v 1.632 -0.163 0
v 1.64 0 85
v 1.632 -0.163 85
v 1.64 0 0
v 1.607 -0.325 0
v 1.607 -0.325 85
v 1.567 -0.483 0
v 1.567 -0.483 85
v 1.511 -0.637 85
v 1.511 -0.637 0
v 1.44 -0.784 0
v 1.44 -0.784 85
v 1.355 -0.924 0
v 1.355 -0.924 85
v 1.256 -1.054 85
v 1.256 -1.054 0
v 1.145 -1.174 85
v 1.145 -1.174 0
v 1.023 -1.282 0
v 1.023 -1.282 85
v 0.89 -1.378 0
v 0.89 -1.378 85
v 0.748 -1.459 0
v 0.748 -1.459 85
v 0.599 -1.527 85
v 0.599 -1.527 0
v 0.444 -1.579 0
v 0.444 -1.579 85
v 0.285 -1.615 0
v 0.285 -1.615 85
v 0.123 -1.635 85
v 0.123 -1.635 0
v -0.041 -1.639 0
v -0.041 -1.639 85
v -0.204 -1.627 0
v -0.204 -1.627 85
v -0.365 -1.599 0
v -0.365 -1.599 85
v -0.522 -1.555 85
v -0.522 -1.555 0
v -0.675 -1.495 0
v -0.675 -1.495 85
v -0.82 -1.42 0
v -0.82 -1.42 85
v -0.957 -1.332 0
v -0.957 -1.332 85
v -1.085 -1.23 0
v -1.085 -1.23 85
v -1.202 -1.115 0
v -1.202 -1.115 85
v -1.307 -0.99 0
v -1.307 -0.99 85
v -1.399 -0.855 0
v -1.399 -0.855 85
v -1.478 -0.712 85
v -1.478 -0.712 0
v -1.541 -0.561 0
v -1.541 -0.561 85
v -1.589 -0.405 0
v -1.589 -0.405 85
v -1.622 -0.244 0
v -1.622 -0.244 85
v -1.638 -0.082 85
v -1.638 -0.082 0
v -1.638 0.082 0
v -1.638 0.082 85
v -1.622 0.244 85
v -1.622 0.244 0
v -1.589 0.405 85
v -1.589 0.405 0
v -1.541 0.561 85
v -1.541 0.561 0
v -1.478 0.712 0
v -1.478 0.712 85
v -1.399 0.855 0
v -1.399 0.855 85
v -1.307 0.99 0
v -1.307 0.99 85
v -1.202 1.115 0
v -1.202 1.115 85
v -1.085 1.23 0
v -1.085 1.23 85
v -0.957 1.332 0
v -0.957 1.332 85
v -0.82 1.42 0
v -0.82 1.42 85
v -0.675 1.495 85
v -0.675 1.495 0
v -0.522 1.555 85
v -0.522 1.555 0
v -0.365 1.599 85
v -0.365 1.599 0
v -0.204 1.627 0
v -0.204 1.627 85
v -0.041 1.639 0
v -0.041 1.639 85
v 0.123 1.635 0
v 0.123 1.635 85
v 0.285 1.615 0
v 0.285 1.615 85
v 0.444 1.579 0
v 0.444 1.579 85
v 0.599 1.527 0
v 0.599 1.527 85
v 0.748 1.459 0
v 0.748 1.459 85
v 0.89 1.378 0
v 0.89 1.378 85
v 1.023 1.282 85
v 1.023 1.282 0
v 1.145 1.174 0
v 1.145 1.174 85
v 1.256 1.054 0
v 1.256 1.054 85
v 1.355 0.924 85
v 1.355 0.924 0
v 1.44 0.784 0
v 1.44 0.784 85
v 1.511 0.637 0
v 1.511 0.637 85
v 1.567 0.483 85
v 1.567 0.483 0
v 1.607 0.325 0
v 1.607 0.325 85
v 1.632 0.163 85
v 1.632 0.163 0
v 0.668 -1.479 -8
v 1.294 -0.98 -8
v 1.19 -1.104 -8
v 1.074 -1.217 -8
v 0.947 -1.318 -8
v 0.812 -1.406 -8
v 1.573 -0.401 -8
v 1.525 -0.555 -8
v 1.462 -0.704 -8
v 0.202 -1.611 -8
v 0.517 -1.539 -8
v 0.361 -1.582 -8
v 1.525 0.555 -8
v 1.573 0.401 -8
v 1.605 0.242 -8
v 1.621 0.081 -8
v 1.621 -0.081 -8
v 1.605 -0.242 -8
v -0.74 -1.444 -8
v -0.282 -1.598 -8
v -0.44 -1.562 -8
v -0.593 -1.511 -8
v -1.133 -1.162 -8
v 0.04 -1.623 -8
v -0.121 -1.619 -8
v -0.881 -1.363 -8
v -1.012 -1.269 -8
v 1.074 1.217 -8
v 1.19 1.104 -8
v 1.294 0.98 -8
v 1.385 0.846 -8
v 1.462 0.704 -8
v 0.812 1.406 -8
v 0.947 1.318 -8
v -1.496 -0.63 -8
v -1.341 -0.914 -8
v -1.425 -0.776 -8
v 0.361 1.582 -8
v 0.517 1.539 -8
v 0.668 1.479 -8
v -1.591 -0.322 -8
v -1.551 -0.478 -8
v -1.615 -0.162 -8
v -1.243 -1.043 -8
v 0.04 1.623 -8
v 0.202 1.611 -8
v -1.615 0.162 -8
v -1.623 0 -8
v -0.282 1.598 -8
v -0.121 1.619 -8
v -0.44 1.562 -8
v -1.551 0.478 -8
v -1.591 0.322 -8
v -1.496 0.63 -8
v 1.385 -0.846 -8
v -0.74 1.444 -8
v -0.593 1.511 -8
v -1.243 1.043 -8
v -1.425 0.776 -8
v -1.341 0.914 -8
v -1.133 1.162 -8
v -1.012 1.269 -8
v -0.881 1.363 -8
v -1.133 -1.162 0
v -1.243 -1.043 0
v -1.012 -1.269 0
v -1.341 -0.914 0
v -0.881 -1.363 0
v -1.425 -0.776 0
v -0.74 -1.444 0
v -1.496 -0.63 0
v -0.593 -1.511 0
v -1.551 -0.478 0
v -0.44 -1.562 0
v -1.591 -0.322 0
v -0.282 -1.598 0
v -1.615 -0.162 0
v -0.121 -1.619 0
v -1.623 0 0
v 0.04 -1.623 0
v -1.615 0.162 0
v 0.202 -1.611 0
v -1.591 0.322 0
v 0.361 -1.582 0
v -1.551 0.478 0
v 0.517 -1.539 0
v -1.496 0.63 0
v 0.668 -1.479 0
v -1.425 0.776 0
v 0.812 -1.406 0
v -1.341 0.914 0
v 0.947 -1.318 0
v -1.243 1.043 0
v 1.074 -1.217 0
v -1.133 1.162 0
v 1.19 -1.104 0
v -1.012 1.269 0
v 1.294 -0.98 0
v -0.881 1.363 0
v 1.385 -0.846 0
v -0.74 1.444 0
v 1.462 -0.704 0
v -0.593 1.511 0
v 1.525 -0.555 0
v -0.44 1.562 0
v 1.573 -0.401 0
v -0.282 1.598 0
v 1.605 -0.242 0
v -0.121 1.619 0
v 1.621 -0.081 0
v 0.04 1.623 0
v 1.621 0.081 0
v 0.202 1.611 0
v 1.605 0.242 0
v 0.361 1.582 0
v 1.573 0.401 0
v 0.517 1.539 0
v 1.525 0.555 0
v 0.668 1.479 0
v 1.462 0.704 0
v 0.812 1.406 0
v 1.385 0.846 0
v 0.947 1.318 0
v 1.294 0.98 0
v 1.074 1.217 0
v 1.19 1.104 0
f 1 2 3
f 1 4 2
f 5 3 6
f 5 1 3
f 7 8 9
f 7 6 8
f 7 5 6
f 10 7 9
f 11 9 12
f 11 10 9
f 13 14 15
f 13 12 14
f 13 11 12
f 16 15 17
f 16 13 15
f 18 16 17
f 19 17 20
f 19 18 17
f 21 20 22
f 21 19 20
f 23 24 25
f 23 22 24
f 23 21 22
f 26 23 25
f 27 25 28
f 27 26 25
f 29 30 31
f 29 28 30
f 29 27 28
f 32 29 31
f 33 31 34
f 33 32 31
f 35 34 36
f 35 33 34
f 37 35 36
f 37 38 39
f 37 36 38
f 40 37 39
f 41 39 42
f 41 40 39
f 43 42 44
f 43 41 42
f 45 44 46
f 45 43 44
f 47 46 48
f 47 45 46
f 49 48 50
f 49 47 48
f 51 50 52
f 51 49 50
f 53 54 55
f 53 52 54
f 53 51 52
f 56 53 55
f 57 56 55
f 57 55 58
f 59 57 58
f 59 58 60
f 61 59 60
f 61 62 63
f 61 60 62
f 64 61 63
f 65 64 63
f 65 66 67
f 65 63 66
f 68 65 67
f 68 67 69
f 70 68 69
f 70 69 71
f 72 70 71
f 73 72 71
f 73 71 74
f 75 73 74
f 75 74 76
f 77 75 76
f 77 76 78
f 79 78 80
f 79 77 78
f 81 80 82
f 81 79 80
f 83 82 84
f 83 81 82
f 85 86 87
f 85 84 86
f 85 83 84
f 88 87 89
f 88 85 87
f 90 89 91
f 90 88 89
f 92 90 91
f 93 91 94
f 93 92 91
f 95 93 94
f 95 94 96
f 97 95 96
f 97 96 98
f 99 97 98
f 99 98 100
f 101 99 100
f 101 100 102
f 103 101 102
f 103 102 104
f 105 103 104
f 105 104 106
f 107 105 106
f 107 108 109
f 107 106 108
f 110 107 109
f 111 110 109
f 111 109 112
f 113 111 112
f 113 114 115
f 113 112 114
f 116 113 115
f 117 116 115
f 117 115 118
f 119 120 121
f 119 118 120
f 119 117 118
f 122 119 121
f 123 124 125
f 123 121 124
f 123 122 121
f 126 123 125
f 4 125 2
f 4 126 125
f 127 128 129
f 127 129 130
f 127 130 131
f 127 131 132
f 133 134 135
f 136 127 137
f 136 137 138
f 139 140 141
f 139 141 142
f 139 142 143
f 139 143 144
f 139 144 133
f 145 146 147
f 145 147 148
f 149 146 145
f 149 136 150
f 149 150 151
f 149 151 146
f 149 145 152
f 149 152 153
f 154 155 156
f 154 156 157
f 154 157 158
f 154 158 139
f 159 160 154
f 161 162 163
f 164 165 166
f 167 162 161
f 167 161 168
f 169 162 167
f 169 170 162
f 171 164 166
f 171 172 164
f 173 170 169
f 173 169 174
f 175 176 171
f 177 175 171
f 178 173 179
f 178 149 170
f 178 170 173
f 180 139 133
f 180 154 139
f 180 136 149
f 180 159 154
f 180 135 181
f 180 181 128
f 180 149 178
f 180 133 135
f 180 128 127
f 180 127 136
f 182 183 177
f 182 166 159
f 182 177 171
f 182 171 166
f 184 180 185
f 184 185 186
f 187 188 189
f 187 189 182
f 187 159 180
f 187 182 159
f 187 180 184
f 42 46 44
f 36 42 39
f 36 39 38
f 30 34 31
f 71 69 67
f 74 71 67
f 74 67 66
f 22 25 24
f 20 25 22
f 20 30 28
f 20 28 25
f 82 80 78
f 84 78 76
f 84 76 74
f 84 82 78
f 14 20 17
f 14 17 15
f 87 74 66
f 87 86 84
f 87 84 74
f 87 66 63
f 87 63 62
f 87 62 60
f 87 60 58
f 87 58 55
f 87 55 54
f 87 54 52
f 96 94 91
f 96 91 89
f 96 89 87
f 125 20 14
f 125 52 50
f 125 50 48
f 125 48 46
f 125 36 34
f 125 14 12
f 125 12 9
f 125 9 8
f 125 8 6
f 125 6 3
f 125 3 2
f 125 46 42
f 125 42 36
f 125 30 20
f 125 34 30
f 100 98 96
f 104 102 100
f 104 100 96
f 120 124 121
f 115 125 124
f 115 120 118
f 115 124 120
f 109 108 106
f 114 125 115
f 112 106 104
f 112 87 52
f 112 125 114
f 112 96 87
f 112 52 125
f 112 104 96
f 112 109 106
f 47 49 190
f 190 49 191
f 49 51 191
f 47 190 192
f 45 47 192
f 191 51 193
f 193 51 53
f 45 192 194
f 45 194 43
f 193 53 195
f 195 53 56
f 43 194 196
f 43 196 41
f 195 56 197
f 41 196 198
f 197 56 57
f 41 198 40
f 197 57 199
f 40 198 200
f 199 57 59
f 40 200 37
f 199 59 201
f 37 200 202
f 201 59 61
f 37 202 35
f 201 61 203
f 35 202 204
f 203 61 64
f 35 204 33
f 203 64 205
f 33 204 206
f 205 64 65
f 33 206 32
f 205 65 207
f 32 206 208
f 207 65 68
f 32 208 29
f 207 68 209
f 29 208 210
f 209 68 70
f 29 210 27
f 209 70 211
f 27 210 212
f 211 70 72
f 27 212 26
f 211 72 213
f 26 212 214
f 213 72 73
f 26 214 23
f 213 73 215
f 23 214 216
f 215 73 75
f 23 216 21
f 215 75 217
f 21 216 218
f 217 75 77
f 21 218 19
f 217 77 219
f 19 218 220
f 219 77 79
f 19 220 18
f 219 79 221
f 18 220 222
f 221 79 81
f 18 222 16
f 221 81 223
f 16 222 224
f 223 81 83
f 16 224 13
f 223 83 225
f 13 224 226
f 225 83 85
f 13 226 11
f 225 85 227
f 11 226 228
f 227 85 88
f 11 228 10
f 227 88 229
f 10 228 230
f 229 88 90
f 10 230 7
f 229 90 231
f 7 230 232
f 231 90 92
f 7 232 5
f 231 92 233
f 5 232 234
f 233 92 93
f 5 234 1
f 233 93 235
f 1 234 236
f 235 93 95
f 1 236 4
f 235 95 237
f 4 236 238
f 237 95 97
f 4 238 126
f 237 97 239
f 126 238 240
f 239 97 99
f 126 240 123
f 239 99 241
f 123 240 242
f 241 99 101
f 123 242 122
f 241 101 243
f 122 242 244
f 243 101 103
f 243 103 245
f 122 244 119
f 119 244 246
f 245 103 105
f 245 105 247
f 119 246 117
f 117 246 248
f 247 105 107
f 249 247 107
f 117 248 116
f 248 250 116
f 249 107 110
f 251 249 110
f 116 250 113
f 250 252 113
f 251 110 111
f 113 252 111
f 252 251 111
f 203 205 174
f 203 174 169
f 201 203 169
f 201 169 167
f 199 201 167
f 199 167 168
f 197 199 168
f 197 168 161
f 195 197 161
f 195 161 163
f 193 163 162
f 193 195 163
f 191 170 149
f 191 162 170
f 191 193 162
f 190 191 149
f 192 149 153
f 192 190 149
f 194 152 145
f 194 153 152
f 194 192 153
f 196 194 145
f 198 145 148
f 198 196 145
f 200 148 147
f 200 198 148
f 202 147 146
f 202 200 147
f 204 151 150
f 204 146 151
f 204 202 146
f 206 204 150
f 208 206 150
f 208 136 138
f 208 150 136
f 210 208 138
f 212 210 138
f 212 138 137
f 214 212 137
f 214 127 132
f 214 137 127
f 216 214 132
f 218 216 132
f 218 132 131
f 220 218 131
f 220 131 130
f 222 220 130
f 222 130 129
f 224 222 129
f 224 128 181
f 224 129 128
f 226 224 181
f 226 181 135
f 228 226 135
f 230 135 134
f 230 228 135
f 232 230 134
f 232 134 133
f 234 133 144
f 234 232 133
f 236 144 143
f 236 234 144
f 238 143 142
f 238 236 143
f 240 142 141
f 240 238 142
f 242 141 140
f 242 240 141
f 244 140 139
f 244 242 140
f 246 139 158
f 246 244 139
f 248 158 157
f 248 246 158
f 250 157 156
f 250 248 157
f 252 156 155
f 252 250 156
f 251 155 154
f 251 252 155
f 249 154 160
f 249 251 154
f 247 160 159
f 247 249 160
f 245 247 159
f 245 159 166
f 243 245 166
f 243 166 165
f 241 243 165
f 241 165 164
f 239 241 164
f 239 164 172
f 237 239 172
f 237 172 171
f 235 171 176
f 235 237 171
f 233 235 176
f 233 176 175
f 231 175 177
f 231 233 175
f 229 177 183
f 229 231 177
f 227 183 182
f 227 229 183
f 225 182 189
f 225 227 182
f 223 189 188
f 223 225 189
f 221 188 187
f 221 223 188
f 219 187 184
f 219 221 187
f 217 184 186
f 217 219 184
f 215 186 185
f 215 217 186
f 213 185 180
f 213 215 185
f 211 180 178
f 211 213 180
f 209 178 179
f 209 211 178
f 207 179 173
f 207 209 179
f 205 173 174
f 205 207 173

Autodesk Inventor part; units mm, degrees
ref_plane "YZ Plane" through (0, 0, 0) normal (1, 0, 0) x (0, 1, 0)
ref_plane "XZ Plane" through (0, 0, 0) normal (0, 1, 0) x (-1, 0, 0)
ref_plane "XY Plane" through (0, 0, 0) normal (0, 0, 1) x (1, 0, 0)
sketch "Sketch1" plane through (0, 0, 0) normal (0, 0, 1) x (1, 0, 0)
  circle A0 centre (0, 0) radius 1.64
  dimension "d0" = 3.28
extrude "Extrusion1" add sketch "Sketch1" along normal blind 75
sketch "Sketch2" plane through (0, 0, 75) normal (0, 0, 1) x (1, 0, 0)
  point P0 (0, 0)
sketch "Sketch3" plane through (0, 0, 75) normal (0, 0, 1) x (1, 0, 0)
  circle A0 centre (0, 0) radius 1.64
extrude "Extrusion2" add sketch "Sketch3" along normal blind 10
sketch "Sketch4" plane through (0, 0, 0) normal (0, 0, -1) x (-1, 0, 0)
  circle A0 centre (0, 0) radius 1.6231
extrude "Extrusion3" add sketch "Sketch4" along normal blind 8
properties part number "rod"
